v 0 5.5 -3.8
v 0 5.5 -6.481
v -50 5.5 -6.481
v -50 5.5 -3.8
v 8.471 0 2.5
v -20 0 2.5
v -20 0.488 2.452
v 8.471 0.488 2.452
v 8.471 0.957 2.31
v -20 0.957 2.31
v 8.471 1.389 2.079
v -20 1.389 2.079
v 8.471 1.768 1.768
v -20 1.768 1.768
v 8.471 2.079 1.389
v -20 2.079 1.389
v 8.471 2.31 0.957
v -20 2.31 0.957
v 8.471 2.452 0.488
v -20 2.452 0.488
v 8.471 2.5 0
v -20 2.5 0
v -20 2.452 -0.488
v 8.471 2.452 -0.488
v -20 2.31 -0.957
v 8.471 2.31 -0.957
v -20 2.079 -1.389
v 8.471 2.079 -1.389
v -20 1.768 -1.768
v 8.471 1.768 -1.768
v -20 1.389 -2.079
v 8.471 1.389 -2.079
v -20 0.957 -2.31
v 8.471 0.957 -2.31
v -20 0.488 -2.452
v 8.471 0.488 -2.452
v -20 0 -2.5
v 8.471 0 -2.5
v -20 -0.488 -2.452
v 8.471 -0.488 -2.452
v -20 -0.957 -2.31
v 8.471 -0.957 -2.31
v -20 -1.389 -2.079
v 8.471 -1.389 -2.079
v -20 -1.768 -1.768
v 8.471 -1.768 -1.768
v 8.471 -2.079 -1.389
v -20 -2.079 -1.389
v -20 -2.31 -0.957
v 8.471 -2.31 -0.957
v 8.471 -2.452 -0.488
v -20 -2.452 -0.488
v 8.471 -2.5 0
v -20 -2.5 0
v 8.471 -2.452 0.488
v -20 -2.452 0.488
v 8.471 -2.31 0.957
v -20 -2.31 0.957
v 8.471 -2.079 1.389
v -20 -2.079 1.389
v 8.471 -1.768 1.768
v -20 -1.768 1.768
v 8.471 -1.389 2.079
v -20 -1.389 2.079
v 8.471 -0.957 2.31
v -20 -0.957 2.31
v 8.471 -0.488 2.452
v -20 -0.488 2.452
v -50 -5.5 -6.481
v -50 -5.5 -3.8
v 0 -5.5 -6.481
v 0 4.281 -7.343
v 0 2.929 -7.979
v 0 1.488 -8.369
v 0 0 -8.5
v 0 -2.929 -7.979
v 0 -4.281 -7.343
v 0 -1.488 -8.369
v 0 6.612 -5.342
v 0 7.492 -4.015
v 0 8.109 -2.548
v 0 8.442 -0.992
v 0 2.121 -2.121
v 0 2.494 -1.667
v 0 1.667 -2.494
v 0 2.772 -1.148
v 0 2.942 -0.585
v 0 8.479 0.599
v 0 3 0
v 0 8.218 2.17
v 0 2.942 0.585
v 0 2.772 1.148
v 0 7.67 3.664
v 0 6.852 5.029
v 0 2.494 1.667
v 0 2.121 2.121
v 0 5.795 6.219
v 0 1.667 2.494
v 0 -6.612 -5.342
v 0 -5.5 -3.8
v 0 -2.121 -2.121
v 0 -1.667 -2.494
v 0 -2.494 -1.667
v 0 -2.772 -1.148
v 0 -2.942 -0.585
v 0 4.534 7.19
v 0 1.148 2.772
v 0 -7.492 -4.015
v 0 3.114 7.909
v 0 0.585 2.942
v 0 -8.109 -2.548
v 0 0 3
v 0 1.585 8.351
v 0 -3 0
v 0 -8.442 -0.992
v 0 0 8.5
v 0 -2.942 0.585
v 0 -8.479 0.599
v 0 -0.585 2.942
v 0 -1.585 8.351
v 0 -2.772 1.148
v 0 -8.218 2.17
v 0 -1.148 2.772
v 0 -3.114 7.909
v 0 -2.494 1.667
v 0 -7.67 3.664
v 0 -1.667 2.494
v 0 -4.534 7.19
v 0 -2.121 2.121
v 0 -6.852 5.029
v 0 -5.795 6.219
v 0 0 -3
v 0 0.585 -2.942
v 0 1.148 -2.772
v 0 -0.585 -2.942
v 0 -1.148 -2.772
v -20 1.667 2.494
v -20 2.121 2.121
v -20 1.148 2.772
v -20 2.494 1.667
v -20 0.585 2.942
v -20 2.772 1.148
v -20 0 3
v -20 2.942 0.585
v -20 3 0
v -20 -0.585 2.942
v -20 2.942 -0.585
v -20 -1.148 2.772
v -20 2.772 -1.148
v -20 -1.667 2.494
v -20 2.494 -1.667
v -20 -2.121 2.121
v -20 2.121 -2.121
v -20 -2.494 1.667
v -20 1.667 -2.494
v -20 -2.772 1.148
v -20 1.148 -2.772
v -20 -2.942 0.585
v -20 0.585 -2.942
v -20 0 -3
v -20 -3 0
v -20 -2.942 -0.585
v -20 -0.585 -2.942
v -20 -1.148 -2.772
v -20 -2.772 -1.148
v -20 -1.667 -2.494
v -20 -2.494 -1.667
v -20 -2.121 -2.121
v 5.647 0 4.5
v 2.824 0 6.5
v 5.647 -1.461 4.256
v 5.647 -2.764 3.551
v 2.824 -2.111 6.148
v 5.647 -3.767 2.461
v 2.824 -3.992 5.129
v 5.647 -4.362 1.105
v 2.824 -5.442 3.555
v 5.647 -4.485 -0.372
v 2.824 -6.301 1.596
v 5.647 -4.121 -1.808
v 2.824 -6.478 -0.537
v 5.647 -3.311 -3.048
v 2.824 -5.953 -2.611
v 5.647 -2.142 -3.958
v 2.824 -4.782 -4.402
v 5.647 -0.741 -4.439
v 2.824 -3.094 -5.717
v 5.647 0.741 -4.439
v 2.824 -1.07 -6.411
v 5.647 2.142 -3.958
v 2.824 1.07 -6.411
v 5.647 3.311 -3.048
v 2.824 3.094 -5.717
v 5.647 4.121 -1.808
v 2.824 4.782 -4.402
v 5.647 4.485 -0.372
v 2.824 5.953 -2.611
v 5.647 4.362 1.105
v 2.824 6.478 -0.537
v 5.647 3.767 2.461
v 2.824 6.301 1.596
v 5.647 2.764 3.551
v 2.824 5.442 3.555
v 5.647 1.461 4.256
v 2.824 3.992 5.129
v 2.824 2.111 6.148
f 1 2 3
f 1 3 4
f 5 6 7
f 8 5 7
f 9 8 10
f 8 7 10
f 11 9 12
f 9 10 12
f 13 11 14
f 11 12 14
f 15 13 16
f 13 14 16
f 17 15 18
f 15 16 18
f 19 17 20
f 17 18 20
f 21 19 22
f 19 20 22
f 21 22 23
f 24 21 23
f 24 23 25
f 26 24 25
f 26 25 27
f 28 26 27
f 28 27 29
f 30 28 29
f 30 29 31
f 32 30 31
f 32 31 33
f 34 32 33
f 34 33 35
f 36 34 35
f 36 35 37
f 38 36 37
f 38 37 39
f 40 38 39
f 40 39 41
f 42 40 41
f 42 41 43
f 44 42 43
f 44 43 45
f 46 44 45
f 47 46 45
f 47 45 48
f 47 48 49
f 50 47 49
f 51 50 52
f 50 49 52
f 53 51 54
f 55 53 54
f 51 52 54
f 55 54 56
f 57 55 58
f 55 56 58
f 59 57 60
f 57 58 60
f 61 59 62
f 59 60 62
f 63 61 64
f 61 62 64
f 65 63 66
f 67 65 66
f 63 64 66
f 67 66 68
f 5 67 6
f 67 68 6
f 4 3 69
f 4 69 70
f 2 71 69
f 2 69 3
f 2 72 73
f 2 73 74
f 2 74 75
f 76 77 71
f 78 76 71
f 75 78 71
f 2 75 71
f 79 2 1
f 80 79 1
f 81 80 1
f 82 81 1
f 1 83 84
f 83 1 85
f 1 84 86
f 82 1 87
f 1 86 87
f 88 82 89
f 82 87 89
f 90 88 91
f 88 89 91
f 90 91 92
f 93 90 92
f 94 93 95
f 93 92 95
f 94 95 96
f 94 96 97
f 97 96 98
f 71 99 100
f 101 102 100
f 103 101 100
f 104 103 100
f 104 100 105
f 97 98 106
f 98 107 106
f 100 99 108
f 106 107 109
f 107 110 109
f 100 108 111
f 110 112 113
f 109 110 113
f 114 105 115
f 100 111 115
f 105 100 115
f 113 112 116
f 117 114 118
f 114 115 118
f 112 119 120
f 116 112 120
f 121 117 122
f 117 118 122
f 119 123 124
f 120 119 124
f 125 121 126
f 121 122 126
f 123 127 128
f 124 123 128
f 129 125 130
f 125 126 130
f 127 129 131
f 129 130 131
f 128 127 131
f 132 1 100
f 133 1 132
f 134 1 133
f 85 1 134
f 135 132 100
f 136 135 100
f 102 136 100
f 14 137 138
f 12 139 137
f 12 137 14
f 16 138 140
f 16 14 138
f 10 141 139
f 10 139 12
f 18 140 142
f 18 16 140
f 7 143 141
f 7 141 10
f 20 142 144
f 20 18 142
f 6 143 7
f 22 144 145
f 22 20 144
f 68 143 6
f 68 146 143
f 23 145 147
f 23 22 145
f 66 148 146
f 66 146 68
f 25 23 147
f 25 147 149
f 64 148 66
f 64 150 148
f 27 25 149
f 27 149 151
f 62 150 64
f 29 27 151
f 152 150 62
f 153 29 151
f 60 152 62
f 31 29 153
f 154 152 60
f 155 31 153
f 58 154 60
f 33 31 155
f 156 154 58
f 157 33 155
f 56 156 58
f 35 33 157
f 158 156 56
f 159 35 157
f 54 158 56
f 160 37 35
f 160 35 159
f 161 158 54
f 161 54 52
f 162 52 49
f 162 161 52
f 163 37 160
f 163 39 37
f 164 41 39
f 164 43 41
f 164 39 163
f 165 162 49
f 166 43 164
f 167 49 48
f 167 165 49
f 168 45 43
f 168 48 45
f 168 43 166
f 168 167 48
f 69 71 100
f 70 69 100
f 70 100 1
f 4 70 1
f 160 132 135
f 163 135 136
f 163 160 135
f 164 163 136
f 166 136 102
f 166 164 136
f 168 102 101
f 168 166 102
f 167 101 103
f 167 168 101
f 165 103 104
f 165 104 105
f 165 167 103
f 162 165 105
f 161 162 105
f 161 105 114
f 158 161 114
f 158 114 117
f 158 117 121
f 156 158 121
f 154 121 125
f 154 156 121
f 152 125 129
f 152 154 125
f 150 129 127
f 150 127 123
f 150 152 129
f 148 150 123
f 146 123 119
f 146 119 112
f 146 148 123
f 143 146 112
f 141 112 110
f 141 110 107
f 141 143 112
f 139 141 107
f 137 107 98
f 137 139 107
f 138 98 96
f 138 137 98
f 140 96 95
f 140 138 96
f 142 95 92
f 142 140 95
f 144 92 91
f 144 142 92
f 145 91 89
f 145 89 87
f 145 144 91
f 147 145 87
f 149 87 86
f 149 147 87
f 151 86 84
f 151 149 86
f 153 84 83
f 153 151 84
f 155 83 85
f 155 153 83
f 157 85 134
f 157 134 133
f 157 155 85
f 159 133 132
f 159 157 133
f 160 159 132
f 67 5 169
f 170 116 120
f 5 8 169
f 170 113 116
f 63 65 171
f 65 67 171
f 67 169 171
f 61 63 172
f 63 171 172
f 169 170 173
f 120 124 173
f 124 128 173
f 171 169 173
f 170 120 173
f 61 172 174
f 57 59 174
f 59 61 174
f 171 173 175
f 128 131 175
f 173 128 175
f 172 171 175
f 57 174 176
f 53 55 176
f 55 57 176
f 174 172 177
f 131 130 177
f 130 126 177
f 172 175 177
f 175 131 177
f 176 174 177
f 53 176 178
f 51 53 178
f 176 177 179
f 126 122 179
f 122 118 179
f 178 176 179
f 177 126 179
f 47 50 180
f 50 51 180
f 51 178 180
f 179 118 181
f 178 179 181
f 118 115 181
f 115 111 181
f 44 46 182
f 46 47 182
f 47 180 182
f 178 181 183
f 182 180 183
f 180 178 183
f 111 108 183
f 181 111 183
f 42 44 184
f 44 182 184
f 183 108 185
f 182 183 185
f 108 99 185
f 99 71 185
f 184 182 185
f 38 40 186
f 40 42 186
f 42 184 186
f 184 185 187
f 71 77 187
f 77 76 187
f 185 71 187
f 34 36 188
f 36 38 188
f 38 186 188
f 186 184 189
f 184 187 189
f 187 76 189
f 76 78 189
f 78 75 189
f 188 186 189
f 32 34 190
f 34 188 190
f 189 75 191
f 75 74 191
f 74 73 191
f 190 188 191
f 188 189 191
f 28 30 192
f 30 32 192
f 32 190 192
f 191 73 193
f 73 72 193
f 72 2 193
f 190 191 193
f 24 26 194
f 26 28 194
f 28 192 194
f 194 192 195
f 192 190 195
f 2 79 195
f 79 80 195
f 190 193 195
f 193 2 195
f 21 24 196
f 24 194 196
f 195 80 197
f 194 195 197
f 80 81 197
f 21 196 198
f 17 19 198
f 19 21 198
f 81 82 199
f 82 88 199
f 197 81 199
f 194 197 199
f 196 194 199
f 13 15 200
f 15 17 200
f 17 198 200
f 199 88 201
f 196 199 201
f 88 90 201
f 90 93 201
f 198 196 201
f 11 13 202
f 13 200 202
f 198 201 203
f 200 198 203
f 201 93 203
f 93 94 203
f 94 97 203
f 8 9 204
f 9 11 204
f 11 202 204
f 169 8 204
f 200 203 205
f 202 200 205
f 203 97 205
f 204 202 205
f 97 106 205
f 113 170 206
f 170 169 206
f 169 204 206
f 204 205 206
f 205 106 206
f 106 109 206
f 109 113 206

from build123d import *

# Parameters (mm, degrees)
SKETCH_2_R          = 2.5
CUT_EXTRUDE_3_DEPTH = 20
EXTRUDE_START       = 20
SKETCH_4_R          = 3
SKETCH_4_R_2        = 2.5
EXTRUDE_1_DEPTH     = 20
SKETCH_5_W          = 2.680740698
SKETCH_5_H          = 11
EXTRUDE_2_DEPTH     = 50


with BuildPart() as part:
    # 草圖1 → 旋轉2 (revolve)
    with BuildSketch(Plane.XY, mode=Mode.PRIVATE) as revolve_2_sk:
        Polygon((0, 8.5), (0, 0), (12, 0), align=None)
    revolve(revolve_2_sk.sketch.rotate(Axis((0, 0, 0), (1, 0, 0)), 90), axis=Axis((0, 0, 0), (1, 0, 0)))

    # 草圖2 → 除料-伸長3 (cut)
    with BuildSketch(Plane.ZY):
        Circle(SKETCH_2_R)
    extrude(amount=-CUT_EXTRUDE_3_DEPTH, mode=Mode.SUBTRACT)

    # 草圖4 → 填料-伸長1 (add)
    with BuildSketch(Plane.ZY.offset(EXTRUDE_START)):
        with Locations(Location((0, 0, 0), (0, 0, 180))):
            Circle(SKETCH_4_R)
        Circle(SKETCH_4_R_2, mode=Mode.SUBTRACT)
    extrude(amount=-EXTRUDE_1_DEPTH)

    # 草圖5 → 填料-伸長2 (add)
    with BuildSketch(Plane.ZY):
        with Locations((-5.140370349, 0)):
            Rectangle(SKETCH_5_W, SKETCH_5_H)
    extrude(amount=EXTRUDE_2_DEPTH)


solid = part.part
